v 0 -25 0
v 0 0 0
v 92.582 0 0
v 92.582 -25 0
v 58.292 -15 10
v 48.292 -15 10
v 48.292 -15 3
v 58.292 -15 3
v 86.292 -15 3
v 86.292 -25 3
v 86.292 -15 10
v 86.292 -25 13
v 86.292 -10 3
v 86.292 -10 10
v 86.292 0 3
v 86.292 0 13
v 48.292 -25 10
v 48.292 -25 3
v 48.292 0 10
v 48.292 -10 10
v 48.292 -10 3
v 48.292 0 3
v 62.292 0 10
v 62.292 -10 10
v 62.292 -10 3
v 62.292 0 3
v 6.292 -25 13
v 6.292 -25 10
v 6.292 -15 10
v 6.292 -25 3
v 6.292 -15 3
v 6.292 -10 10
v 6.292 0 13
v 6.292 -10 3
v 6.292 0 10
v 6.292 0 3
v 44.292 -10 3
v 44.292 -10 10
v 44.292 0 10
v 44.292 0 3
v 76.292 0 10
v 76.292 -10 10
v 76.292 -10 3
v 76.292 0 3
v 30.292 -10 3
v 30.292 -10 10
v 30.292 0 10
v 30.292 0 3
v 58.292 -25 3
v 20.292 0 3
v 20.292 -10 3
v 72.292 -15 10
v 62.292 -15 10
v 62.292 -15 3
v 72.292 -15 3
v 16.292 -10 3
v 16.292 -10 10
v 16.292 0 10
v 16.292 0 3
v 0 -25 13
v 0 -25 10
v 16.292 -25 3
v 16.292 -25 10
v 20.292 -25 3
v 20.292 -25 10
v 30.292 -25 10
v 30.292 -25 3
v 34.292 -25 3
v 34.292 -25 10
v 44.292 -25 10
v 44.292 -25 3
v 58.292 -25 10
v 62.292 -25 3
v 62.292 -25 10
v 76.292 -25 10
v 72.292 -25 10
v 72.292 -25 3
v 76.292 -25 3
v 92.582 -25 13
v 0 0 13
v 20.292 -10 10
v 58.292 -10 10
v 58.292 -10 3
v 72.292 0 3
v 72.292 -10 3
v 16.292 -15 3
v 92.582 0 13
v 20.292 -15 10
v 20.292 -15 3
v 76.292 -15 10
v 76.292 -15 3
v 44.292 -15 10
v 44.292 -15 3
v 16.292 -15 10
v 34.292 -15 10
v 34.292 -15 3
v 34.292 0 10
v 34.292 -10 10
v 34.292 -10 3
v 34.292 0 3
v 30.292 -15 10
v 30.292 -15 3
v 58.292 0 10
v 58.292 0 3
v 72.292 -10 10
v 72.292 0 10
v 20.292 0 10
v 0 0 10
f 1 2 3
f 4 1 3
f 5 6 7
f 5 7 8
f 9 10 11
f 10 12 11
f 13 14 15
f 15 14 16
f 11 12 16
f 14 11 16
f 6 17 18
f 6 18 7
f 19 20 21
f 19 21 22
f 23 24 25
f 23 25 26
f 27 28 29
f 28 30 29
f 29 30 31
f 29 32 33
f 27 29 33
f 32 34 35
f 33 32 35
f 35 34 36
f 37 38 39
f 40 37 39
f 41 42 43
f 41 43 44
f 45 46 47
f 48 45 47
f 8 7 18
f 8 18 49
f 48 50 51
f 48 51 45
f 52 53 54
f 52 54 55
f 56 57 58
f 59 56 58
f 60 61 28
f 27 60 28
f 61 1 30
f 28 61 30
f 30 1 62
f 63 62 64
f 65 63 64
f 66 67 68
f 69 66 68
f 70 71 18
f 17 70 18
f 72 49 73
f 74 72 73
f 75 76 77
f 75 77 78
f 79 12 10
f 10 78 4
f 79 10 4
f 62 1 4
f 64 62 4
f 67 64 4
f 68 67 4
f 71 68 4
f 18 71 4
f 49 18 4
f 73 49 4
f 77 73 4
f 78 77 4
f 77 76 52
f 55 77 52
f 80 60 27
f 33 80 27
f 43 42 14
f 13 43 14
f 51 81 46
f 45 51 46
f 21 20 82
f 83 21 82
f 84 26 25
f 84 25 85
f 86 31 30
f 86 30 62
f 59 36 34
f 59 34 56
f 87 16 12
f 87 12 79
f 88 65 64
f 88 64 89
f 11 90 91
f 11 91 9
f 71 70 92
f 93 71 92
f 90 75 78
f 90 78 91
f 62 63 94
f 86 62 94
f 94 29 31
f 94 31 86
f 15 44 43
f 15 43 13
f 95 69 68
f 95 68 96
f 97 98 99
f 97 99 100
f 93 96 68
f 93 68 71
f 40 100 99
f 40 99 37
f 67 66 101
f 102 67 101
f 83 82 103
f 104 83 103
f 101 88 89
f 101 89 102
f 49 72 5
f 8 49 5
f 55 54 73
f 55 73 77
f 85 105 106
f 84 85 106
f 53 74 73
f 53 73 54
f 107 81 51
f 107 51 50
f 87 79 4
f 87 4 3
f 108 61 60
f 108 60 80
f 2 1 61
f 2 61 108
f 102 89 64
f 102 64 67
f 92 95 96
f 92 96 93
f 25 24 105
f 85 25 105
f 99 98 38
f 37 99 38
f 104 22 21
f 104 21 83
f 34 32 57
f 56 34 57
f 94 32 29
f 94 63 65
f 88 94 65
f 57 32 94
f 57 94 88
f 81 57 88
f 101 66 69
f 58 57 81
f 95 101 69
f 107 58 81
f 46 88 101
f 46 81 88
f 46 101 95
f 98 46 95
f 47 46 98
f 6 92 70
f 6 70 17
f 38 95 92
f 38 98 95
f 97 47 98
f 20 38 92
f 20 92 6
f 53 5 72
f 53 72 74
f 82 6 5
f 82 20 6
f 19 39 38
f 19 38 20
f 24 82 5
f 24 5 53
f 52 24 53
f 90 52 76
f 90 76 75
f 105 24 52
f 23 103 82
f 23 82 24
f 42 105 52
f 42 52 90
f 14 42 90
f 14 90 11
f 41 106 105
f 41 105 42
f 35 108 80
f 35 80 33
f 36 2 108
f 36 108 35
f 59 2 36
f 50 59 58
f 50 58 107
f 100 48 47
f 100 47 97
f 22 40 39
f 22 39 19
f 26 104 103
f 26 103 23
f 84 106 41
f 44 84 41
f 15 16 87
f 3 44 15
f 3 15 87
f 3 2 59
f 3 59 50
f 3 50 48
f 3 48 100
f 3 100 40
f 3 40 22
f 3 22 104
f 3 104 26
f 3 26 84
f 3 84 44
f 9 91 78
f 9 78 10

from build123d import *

# Parameters (mm, degrees)
SKETCH1_W           = 80
SKETCH1_H           = 25
BOSS_EXTRUDE1_DEPTH = 10
SKETCH3_2_W         = 10
SKETCH3_2_H         = 10
CUT_EXTRUDE1_DEPTH  = 7
SKETCH3_3_W         = 10
SKETCH3_3_H         = 10
CUT_EXTRUDE2_DEPTH  = 7
SKETCH3_W           = 10
SKETCH3_H           = 10
CUT_EXTRUDE3_DEPTH  = 7
SKETCH3_6_W         = 10
SKETCH3_6_H         = 10
CUT_EXTRUDE4_DEPTH  = 7
SKETCH3_7_W         = 10
SKETCH3_7_H         = 10
CUT_EXTRUDE5_DEPTH  = 7
SKETCH3_8_W         = 10
SKETCH3_8_H         = 10
CUT_EXTRUDE6_DEPTH  = 7
SKETCH3_9_W         = 10
SKETCH3_9_H         = 10
CUT_EXTRUDE7_DEPTH  = 7
SKETCH3_10_W        = 10
SKETCH3_10_H        = 10
CUT_EXTRUDE8_DEPTH  = 7
SKETCH3_11_W        = 10
SKETCH3_11_H        = 10
CUT_EXTRUDE9_DEPTH  = 7
SKETCH3_12_W        = 10
SKETCH3_12_H        = 10
CUT_EXTRUDE10_DEPTH = 7
SKETCH4_W           = 16.29
SKETCH4_H           = 25
BOSS_EXTRUDE2_DEPTH = 10
SKETCH5_W           = 10
SKETCH5_H           = 10
CUT_EXTRUDE12_DEPTH = 7
SKETCH6_W           = 6.292169455
SKETCH6_H           = 25
SKETCH6_W_2         = 6.29
BOSS_EXTRUDE3_DEPTH = 3


with BuildPart() as part:
    # Sketch1 → Boss-Extrude1 (new body)
    with BuildSketch(Plane.XY):
        with Locations((40, -12.5)):
            Rectangle(SKETCH1_W, SKETCH1_H)
    extrude(amount=BOSS_EXTRUDE1_DEPTH)

    # Sketch3<2> → Cut-Extrude1 (cut)
    with BuildSketch(Plane.XY.offset(10)):
        with Locations((11.292169455, -5)):
            Rectangle(SKETCH3_2_W, SKETCH3_2_H)
    extrude(amount=-CUT_EXTRUDE1_DEPTH, mode=Mode.SUBTRACT)

    # Sketch3<3> → Cut-Extrude2 (cut)
    with BuildSketch(Plane.XY.offset(10)):
        with Locations((25.292169455, -5)):
            Rectangle(SKETCH3_3_W, SKETCH3_3_H)
    extrude(amount=-CUT_EXTRUDE2_DEPTH, mode=Mode.SUBTRACT)

    # Sketch3 → Cut-Extrude3 (cut)
    with BuildSketch(Plane.XY.offset(10)):
        with Locations((39.292169455, -5)):
            Rectangle(SKETCH3_W, SKETCH3_H)
    extrude(amount=-CUT_EXTRUDE3_DEPTH, mode=Mode.SUBTRACT)

    # Sketch3<6> → Cut-Extrude4 (cut)
    with BuildSketch(Plane.XY.offset(10)):
        with Locations((53.292169455, -5)):
            Rectangle(SKETCH3_6_W, SKETCH3_6_H)
    extrude(amount=-CUT_EXTRUDE4_DEPTH, mode=Mode.SUBTRACT)

    # Sketch3<7> → Cut-Extrude5 (cut)
    with BuildSketch(Plane.XY.offset(10)):
        with Locations((67.292169455, -5)):
            Rectangle(SKETCH3_7_W, SKETCH3_7_H)
    extrude(amount=-CUT_EXTRUDE5_DEPTH, mode=Mode.SUBTRACT)

    # Sketch3<8> → Cut-Extrude6 (cut)
    with BuildSketch(Plane.XY.offset(10)):
        with Locations((67.292169455, -20)):
            Rectangle(SKETCH3_8_W, SKETCH3_8_H)
    extrude(amount=-CUT_EXTRUDE6_DEPTH, mode=Mode.SUBTRACT)

    # Sketch3<9> → Cut-Extrude7 (cut)
    with BuildSketch(Plane.XY.offset(10)):
        with Locations((53.292169455, -20)):
            Rectangle(SKETCH3_9_W, SKETCH3_9_H)
    extrude(amount=-CUT_EXTRUDE7_DEPTH, mode=Mode.SUBTRACT)

    # Sketch3<10> → Cut-Extrude8 (cut)
    with BuildSketch(Plane.XY.offset(10)):
        with Locations((39.292169455, -20)):
            Rectangle(SKETCH3_10_W, SKETCH3_10_H)
    extrude(amount=-CUT_EXTRUDE8_DEPTH, mode=Mode.SUBTRACT)

    # Sketch3<11> → Cut-Extrude9 (cut)
    with BuildSketch(Plane.XY.offset(10)):
        with Locations((25.292169455, -20)):
            Rectangle(SKETCH3_11_W, SKETCH3_11_H)
    extrude(amount=-CUT_EXTRUDE9_DEPTH, mode=Mode.SUBTRACT)

    # Sketch3<12> → Cut-Extrude10 (cut)
    with BuildSketch(Plane.XY.offset(10)):
        with Locations((11.292169455, -20)):
            Rectangle(SKETCH3_12_W, SKETCH3_12_H)
    extrude(amount=-CUT_EXTRUDE10_DEPTH, mode=Mode.SUBTRACT)

    # Sketch4 → Boss-Extrude2 (add)
    with BuildSketch(Plane.XY.offset(10)):
        with Locations((84.437169455, -12.5)):
            Rectangle(SKETCH4_W, SKETCH4_H)
    extrude(amount=-BOSS_EXTRUDE2_DEPTH)

    # Sketch5 → Cut-Extrude12 (cut)
    with BuildSketch(Plane.XY.offset(10)):
        with Locations((81.292169455, -5)):
            Rectangle(SKETCH5_W, SKETCH5_H)
        with Locations((81.292169455, -20)):
            Rectangle(SKETCH5_W, SKETCH5_H)
    extrude(amount=-CUT_EXTRUDE12_DEPTH, mode=Mode.SUBTRACT)

    # Sketch6 → Boss-Extrude3 (add)
    with BuildSketch(Plane.XY.offset(10)):
        with Locations((3.146084728, -12.5)):
            Rectangle(SKETCH6_W, SKETCH6_H)
        with Locations((89.437169455, -12.5)):
            Rectangle(SKETCH6_W_2, SKETCH6_H)
    extrude(amount=BOSS_EXTRUDE3_DEPTH)


solid = part.part
